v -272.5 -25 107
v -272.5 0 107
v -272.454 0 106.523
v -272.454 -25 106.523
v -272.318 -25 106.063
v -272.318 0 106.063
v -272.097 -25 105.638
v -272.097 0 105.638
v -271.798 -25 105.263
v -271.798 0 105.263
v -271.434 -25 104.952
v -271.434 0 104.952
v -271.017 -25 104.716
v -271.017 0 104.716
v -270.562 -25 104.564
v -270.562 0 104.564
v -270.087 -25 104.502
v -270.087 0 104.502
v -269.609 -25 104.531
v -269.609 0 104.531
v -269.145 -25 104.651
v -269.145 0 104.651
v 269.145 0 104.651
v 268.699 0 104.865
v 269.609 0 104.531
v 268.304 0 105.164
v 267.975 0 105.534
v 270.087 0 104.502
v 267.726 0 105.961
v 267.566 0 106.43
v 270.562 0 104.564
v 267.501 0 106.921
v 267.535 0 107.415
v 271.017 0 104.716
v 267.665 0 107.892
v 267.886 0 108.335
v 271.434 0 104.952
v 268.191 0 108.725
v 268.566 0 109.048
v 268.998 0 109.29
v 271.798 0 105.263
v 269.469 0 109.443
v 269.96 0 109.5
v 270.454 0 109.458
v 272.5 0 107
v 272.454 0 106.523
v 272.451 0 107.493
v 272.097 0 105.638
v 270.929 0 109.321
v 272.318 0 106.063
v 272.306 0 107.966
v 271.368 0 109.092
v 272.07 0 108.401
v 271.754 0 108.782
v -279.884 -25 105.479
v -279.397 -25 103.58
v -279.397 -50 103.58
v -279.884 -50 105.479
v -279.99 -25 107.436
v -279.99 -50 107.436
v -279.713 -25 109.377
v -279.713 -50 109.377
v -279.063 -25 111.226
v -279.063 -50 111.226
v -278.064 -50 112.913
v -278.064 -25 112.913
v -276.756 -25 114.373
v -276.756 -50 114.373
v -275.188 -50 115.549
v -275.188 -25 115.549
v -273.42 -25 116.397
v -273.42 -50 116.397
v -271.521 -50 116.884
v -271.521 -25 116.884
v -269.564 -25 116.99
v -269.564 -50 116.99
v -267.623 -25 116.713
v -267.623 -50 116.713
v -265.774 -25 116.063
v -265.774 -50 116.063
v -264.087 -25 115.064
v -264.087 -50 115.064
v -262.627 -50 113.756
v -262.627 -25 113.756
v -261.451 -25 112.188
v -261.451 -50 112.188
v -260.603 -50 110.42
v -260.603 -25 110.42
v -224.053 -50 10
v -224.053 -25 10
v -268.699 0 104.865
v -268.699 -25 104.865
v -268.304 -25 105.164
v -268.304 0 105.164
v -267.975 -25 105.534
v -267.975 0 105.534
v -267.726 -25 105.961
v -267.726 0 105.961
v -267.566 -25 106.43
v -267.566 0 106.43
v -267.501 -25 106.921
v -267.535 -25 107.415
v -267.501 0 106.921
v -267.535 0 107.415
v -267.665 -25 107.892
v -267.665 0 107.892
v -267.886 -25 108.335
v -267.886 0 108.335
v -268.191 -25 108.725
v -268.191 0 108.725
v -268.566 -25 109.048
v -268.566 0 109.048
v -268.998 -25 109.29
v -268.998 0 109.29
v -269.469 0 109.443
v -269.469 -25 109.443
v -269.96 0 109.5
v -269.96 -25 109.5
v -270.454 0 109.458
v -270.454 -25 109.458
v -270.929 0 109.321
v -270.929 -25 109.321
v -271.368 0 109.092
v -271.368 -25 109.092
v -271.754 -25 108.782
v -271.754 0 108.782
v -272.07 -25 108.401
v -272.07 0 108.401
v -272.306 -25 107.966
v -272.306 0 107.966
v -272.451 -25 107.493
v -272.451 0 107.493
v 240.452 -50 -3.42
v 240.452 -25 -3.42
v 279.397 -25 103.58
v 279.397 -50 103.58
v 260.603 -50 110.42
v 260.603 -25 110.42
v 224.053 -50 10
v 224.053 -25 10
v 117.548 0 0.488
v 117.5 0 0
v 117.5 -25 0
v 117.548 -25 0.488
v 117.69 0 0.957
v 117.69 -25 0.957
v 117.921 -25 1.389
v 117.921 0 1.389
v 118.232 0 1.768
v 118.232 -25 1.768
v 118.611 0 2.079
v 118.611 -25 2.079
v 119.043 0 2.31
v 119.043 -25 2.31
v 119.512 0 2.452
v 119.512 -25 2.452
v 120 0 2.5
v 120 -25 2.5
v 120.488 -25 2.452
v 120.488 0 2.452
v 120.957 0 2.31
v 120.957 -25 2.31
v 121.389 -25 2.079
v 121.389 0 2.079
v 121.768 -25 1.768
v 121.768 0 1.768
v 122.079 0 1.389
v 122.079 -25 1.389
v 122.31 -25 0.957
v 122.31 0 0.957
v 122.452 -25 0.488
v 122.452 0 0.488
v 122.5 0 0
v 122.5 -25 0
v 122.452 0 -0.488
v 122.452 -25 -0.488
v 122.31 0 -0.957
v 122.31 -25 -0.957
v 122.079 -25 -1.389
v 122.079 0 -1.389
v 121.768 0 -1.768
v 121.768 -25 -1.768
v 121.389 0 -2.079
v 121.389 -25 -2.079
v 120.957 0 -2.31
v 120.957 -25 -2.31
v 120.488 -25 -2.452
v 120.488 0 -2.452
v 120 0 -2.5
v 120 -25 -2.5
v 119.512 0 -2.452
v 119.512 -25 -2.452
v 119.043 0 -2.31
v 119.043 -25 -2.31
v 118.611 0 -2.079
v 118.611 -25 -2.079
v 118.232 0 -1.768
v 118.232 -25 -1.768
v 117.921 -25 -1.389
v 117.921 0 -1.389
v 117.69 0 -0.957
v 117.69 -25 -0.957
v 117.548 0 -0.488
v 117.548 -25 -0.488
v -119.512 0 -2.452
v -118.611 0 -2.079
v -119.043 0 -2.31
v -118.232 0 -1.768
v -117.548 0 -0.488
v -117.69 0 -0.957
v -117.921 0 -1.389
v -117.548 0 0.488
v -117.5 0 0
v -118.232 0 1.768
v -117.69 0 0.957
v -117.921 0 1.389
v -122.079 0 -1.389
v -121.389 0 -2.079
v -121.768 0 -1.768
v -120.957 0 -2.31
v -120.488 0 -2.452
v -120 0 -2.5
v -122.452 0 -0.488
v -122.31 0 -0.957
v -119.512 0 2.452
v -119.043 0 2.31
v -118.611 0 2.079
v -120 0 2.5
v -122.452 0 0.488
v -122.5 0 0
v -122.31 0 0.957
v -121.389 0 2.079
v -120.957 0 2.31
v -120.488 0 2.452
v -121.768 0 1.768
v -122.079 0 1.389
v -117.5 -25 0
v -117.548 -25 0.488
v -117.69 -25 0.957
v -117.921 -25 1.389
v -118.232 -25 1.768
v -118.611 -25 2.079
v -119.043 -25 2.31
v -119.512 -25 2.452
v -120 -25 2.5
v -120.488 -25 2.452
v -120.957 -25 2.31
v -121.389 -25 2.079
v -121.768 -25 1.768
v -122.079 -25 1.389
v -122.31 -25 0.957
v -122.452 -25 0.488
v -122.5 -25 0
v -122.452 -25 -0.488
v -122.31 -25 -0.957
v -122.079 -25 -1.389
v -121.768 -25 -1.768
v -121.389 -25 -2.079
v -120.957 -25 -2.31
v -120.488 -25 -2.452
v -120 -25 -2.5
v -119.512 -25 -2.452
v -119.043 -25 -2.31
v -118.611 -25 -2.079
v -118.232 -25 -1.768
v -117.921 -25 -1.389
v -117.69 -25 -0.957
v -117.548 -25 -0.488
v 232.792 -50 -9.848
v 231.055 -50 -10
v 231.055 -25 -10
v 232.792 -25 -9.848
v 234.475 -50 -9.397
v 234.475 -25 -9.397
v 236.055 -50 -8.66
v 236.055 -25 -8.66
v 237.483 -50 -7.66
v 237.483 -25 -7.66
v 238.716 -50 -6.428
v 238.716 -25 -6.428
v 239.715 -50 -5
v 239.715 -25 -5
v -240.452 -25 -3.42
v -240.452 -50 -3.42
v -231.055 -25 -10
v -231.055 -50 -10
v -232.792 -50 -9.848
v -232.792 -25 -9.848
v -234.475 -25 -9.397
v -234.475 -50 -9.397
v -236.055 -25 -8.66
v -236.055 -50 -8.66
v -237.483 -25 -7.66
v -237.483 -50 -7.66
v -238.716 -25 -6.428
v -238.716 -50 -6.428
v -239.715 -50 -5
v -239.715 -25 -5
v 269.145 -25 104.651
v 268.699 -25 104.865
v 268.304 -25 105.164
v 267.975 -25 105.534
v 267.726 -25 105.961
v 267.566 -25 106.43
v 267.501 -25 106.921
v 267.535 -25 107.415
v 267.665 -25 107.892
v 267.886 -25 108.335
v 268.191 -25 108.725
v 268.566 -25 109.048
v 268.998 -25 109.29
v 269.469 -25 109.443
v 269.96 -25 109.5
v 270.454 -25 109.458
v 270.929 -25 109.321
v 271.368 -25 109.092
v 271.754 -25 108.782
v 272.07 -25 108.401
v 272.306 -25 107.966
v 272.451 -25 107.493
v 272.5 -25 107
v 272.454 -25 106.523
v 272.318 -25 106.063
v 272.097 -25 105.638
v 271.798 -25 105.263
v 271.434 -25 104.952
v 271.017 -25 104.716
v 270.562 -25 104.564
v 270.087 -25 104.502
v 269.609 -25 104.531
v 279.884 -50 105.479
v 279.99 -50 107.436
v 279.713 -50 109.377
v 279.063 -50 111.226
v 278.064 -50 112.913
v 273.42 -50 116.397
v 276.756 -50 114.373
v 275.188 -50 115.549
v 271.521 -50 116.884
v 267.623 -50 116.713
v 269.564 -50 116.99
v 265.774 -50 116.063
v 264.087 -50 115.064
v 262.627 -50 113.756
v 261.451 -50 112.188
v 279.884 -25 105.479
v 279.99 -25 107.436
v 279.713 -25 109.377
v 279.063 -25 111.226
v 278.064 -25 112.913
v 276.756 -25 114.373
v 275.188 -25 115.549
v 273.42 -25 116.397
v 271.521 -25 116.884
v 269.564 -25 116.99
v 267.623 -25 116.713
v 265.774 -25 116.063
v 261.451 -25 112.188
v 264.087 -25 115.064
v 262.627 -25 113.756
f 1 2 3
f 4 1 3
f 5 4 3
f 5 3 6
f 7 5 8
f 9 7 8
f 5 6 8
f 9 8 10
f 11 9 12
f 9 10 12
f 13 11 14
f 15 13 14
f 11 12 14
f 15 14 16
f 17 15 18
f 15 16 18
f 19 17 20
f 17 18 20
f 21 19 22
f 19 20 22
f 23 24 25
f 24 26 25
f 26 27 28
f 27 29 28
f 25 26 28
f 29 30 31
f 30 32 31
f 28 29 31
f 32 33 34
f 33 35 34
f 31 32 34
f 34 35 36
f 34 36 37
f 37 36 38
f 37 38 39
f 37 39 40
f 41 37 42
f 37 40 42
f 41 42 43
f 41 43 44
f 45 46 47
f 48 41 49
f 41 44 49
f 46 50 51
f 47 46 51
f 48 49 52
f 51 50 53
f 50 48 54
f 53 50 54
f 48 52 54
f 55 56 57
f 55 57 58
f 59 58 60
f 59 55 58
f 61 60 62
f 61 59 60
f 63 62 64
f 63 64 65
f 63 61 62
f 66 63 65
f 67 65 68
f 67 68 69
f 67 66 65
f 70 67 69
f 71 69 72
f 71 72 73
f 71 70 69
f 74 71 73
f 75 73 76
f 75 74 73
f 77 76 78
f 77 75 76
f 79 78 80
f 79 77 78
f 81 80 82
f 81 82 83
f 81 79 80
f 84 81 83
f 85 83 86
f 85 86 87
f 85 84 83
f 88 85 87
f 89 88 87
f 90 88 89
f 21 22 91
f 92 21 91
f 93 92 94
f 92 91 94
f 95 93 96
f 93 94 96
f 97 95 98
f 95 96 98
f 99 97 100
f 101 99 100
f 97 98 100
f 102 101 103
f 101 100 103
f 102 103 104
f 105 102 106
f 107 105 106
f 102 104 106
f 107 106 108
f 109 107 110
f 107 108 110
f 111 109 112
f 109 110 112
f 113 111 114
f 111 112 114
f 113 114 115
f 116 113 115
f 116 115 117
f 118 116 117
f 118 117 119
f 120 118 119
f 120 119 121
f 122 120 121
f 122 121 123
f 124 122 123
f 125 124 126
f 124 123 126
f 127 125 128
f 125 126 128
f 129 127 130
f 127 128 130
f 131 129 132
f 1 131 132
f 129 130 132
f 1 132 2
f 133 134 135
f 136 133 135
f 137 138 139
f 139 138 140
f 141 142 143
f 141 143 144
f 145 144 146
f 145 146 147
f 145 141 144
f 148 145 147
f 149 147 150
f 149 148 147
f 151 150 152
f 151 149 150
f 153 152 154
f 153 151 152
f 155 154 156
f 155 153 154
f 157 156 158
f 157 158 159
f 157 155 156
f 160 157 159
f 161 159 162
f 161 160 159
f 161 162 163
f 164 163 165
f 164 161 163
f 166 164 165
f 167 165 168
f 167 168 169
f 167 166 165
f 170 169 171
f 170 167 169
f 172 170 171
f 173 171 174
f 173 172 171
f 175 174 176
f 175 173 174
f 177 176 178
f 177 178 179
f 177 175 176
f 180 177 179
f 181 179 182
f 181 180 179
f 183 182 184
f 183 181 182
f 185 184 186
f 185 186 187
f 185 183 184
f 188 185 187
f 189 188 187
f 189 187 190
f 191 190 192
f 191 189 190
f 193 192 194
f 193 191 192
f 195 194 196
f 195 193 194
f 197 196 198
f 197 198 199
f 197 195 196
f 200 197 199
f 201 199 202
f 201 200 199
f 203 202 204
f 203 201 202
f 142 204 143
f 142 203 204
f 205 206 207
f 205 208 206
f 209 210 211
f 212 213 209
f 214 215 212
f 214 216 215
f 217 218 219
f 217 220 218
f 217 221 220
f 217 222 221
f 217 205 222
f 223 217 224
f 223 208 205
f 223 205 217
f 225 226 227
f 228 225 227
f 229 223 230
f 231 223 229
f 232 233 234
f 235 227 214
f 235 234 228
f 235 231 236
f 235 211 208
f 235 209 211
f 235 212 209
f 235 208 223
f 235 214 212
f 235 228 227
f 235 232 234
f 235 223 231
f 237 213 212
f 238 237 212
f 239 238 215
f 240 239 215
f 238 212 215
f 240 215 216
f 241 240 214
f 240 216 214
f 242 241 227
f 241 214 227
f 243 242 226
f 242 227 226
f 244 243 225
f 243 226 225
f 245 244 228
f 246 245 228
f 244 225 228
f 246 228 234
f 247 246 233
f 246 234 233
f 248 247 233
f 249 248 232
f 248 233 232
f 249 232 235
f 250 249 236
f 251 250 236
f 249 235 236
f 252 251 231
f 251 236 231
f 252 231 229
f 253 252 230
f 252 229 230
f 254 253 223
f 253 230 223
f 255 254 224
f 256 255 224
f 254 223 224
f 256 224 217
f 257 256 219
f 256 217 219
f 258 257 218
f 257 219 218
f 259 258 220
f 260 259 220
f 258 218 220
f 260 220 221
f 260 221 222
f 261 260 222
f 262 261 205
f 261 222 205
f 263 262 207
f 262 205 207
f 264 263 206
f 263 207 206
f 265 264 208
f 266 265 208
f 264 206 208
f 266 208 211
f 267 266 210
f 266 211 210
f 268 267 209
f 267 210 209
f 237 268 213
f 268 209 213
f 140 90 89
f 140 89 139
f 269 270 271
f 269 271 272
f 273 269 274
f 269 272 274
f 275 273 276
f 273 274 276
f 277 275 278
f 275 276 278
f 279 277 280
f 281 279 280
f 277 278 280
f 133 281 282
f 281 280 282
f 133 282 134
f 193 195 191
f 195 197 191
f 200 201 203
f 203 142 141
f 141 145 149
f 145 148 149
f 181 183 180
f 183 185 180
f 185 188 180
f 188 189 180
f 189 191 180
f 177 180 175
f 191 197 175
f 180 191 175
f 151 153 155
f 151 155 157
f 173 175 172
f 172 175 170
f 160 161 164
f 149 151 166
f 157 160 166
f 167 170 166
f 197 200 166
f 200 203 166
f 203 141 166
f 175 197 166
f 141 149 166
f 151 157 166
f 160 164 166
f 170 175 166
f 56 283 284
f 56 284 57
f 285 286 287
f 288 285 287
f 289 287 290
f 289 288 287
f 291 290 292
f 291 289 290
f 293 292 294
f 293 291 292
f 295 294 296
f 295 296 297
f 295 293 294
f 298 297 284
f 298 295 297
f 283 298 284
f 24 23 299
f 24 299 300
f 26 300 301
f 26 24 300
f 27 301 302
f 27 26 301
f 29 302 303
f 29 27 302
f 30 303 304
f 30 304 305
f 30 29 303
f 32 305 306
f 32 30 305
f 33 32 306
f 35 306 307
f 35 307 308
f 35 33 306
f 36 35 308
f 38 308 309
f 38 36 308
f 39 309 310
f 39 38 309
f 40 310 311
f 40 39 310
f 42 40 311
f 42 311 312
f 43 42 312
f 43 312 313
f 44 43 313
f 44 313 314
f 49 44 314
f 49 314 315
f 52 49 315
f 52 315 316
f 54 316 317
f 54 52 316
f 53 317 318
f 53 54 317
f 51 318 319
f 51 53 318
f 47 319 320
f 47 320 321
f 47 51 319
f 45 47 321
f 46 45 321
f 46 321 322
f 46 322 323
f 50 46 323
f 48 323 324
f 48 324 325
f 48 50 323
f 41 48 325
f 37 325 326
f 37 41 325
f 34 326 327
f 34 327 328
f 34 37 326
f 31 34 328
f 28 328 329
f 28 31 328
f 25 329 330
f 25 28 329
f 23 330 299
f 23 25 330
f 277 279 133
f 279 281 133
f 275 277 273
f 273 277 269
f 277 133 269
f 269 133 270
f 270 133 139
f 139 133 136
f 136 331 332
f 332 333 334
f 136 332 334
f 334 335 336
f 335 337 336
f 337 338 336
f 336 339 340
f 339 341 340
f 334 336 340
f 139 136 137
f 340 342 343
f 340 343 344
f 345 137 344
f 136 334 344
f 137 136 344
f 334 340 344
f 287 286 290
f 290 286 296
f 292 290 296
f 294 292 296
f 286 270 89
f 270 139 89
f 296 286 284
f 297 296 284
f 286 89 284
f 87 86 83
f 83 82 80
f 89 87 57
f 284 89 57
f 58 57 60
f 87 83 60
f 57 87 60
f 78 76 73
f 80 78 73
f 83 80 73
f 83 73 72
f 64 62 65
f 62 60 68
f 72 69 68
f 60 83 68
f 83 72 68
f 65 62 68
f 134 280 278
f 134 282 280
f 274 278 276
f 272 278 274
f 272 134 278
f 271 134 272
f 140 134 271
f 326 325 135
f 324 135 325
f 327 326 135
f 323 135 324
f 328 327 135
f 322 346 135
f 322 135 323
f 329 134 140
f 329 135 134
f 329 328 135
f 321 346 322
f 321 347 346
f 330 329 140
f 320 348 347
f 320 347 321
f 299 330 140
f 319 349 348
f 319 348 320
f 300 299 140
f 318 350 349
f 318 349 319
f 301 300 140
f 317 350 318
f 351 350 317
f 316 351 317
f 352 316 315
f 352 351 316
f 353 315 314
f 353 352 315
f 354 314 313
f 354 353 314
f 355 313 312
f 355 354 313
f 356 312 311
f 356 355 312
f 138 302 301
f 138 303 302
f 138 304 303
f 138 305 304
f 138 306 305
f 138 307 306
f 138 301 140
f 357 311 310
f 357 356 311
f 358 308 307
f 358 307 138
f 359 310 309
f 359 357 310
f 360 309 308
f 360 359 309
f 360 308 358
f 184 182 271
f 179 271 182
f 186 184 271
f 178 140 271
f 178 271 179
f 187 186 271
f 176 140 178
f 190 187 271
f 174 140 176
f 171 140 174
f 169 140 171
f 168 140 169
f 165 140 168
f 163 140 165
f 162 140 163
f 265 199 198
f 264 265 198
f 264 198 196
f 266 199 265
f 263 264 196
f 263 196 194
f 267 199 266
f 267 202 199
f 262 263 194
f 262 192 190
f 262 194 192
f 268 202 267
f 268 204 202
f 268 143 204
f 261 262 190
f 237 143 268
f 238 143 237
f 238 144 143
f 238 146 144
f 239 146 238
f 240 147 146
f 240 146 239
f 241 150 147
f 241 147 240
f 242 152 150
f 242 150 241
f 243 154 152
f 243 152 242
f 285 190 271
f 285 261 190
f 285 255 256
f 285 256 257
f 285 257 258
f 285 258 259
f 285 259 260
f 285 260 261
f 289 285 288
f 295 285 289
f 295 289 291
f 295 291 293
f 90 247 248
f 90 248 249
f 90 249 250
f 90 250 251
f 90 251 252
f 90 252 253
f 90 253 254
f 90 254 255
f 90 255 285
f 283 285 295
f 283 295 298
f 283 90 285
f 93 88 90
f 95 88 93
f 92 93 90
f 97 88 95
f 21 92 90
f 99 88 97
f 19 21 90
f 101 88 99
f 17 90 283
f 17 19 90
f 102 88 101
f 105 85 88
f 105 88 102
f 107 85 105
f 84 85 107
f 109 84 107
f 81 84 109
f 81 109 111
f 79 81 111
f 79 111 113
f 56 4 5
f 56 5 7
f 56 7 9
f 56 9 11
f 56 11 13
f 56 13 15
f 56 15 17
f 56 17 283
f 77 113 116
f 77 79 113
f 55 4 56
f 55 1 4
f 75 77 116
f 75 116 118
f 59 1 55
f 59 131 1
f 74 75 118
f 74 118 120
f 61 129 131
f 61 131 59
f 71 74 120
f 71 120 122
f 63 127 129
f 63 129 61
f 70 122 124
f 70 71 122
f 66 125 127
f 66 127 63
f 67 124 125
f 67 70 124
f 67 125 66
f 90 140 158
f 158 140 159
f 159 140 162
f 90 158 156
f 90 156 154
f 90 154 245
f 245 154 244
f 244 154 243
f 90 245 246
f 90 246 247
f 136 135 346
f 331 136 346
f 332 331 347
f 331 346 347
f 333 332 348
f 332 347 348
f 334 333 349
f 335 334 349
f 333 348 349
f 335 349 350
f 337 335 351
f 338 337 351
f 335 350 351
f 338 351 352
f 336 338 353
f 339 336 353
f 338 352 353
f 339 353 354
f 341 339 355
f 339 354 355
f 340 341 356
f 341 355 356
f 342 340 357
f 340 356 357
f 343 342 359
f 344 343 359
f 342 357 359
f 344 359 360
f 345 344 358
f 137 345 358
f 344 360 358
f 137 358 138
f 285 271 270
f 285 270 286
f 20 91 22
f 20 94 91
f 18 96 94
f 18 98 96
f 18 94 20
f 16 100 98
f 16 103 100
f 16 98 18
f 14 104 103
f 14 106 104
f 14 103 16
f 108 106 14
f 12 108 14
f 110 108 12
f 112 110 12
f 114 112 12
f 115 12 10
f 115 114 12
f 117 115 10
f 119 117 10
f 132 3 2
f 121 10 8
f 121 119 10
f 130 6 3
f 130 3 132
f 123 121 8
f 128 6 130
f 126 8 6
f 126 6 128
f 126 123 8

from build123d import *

# Parameters (mm, degrees)
F1_DEPTH = 50
F2_DEPTH = 25


with BuildPart() as f1:
    # F0 (on Front) → F1 (new body)
    with BuildSketch(Plane.XZ):
        with BuildLine():
            ThreePointArc((231.0551849335, -10), (223.9841171217, -7.0710678119), (221.0551849335, 0))
            ThreePointArc((221.0551849335, 0), (221.2071074034, 1.7364817767), (221.6582587257, 3.4202014333))
            Line((221.6582587257, 3.4202014333), (224.0531095514, 10))
            Line((224.0531095514, 10), (0, 10))
            ThreePointArc((0, 10), (-10, 0), (0, -10))
            Line((0, -10), (231.0551849335, -10))
        make_face()
        with BuildLine():
            ThreePointArc((122.5, 0), (120, -2.5), (117.5, 0))
            ThreePointArc((117.5, 0), (120, 2.5), (122.5, 0))
        make_face(mode=Mode.SUBTRACT)
        with BuildLine():
            Line((231.0551849335, 0), (221.0551849335, 0))
            ThreePointArc((221.0551849335, 0), (223.9841171217, -7.0710678119), (231.0551849335, -10))
            ThreePointArc((231.0551849335, -10), (236.790949297, -8.1915204429), (240.4521111414, -3.4202014333))
            ThreePointArc((240.4521111414, -3.4202014333), (240.1182628039, 4.2261826174), (234.4753863668, 9.3969262079))
            Line((234.4753863668, 9.3969262079), (231.0551849335, 0))
        make_face()
        with BuildLine():
            ThreePointArc((231.0551849335, 10), (232.7916667102, 9.8480775301), (234.4753863668, 9.3969262079))
            ThreePointArc((234.4753863668, 9.3969262079), (240.1182628039, 4.2261826174), (240.4521111414, -3.4202014333))
            Line((240.4521111414, -3.4202014333), (279.3969262079, 103.5797985667))
            ThreePointArc((279.3969262079, 103.5797985667), (273.4202014333, 116.3969262079), (260.6030737921, 110.4202014333))
            Line((260.6030737921, 110.4202014333), (224.0531095514, 10))
            Line((224.0531095514, 10), (231.0551849335, 10))
        make_face()
        with BuildLine():
            ThreePointArc((272.5, 107), (271.4339410909, 104.9521198893), (269.1449496417, 104.650768448))
            ThreePointArc((269.1449496417, 104.650768448), (268.5660589091, 109.0478801107), (272.5, 107))
        make_face(mode=Mode.SUBTRACT)
        with BuildLine():
            ThreePointArc((221.6582587257, 3.4202014333), (221.2071074034, 1.7364817767), (221.0551849335, 0))
            Line((221.0551849335, 0), (231.0551849335, 0))
            Line((231.0551849335, 0), (234.4753863668, 9.3969262079))
            ThreePointArc((234.4753863668, 9.3969262079), (232.7916667102, 9.8480775301), (231.0551849335, 10))
            Line((231.0551849335, 10), (224.0531095514, 10))
            Line((224.0531095514, 10), (221.6582587257, 3.4202014333))
        make_face()
        with BuildLine():
            ThreePointArc((272.5, 107), (268.5660589091, 109.0478801107), (269.1449496417, 104.650768448))
            ThreePointArc((269.1449496417, 104.650768448), (271.4339410909, 104.9521198893), (272.5, 107))
        make_face()
        with BuildLine():
            Line((122.5, 0), (117.5, 0))
            ThreePointArc((117.5, 0), (120, -2.5), (122.5, 0))
        make_face()
        with BuildLine():
            ThreePointArc((122.5, 0), (120, 2.5), (117.5, 0))
            Line((117.5, 0), (122.5, 0))
        make_face()
    extrude(amount=F1_DEPTH)

    # F0 (on Front) → F2 (cut)
    with BuildSketch(Plane.XZ):
        with BuildLine():
            ThreePointArc((231.0551849335, -10), (223.9841171217, -7.0710678119), (221.0551849335, 0))
            ThreePointArc((221.0551849335, 0), (221.2071074034, 1.7364817767), (221.6582587257, 3.4202014333))
            Line((221.6582587257, 3.4202014333), (224.0531095514, 10))
            Line((224.0531095514, 10), (0, 10))
            ThreePointArc((0, 10), (-10, 0), (0, -10))
            Line((0, -10), (231.0551849335, -10))
        make_face()
        with BuildLine():
            ThreePointArc((122.5, 0), (120, -2.5), (117.5, 0))
            ThreePointArc((117.5, 0), (120, 2.5), (122.5, 0))
        make_face(mode=Mode.SUBTRACT)
        with BuildLine():
            ThreePointArc((221.6582587257, 3.4202014333), (221.2071074034, 1.7364817767), (221.0551849335, 0))
            Line((221.0551849335, 0), (231.0551849335, 0))
            Line((231.0551849335, 0), (234.4753863668, 9.3969262079))
            ThreePointArc((234.4753863668, 9.3969262079), (232.7916667102, 9.8480775301), (231.0551849335, 10))
            Line((231.0551849335, 10), (224.0531095514, 10))
            Line((224.0531095514, 10), (221.6582587257, 3.4202014333))
        make_face()
        with BuildLine():
            Line((231.0551849335, 0), (221.0551849335, 0))
            ThreePointArc((221.0551849335, 0), (223.9841171217, -7.0710678119), (231.0551849335, -10))
            ThreePointArc((231.0551849335, -10), (236.790949297, -8.1915204429), (240.4521111414, -3.4202014333))
            ThreePointArc((240.4521111414, -3.4202014333), (240.1182628039, 4.2261826174), (234.4753863668, 9.3969262079))
            Line((234.4753863668, 9.3969262079), (231.0551849335, 0))
        make_face()
        with BuildLine():
            ThreePointArc((231.0551849335, 10), (232.7916667102, 9.8480775301), (234.4753863668, 9.3969262079))
            ThreePointArc((234.4753863668, 9.3969262079), (240.1182628039, 4.2261826174), (240.4521111414, -3.4202014333))
            Line((240.4521111414, -3.4202014333), (279.3969262079, 103.5797985667))
            ThreePointArc((279.3969262079, 103.5797985667), (273.4202014333, 116.3969262079), (260.6030737921, 110.4202014333))
            Line((260.6030737921, 110.4202014333), (224.0531095514, 10))
            Line((224.0531095514, 10), (231.0551849335, 10))
        make_face()
        with BuildLine():
            ThreePointArc((272.5, 107), (271.4339410909, 104.9521198893), (269.1449496417, 104.650768448))
            ThreePointArc((269.1449496417, 104.650768448), (268.5660589091, 109.0478801107), (272.5, 107))
        make_face(mode=Mode.SUBTRACT)
    extrude(amount=F2_DEPTH, mode=Mode.SUBTRACT)

    # F3: F1 across plane


with BuildPart() as f1_1:
    add(f1.part)
    add(f1.part.mirror(Plane.YZ))


with BuildPart() as f4_1:
    # F4: copy of F1
    add(f1_1.part)


solid = f1_1.part
